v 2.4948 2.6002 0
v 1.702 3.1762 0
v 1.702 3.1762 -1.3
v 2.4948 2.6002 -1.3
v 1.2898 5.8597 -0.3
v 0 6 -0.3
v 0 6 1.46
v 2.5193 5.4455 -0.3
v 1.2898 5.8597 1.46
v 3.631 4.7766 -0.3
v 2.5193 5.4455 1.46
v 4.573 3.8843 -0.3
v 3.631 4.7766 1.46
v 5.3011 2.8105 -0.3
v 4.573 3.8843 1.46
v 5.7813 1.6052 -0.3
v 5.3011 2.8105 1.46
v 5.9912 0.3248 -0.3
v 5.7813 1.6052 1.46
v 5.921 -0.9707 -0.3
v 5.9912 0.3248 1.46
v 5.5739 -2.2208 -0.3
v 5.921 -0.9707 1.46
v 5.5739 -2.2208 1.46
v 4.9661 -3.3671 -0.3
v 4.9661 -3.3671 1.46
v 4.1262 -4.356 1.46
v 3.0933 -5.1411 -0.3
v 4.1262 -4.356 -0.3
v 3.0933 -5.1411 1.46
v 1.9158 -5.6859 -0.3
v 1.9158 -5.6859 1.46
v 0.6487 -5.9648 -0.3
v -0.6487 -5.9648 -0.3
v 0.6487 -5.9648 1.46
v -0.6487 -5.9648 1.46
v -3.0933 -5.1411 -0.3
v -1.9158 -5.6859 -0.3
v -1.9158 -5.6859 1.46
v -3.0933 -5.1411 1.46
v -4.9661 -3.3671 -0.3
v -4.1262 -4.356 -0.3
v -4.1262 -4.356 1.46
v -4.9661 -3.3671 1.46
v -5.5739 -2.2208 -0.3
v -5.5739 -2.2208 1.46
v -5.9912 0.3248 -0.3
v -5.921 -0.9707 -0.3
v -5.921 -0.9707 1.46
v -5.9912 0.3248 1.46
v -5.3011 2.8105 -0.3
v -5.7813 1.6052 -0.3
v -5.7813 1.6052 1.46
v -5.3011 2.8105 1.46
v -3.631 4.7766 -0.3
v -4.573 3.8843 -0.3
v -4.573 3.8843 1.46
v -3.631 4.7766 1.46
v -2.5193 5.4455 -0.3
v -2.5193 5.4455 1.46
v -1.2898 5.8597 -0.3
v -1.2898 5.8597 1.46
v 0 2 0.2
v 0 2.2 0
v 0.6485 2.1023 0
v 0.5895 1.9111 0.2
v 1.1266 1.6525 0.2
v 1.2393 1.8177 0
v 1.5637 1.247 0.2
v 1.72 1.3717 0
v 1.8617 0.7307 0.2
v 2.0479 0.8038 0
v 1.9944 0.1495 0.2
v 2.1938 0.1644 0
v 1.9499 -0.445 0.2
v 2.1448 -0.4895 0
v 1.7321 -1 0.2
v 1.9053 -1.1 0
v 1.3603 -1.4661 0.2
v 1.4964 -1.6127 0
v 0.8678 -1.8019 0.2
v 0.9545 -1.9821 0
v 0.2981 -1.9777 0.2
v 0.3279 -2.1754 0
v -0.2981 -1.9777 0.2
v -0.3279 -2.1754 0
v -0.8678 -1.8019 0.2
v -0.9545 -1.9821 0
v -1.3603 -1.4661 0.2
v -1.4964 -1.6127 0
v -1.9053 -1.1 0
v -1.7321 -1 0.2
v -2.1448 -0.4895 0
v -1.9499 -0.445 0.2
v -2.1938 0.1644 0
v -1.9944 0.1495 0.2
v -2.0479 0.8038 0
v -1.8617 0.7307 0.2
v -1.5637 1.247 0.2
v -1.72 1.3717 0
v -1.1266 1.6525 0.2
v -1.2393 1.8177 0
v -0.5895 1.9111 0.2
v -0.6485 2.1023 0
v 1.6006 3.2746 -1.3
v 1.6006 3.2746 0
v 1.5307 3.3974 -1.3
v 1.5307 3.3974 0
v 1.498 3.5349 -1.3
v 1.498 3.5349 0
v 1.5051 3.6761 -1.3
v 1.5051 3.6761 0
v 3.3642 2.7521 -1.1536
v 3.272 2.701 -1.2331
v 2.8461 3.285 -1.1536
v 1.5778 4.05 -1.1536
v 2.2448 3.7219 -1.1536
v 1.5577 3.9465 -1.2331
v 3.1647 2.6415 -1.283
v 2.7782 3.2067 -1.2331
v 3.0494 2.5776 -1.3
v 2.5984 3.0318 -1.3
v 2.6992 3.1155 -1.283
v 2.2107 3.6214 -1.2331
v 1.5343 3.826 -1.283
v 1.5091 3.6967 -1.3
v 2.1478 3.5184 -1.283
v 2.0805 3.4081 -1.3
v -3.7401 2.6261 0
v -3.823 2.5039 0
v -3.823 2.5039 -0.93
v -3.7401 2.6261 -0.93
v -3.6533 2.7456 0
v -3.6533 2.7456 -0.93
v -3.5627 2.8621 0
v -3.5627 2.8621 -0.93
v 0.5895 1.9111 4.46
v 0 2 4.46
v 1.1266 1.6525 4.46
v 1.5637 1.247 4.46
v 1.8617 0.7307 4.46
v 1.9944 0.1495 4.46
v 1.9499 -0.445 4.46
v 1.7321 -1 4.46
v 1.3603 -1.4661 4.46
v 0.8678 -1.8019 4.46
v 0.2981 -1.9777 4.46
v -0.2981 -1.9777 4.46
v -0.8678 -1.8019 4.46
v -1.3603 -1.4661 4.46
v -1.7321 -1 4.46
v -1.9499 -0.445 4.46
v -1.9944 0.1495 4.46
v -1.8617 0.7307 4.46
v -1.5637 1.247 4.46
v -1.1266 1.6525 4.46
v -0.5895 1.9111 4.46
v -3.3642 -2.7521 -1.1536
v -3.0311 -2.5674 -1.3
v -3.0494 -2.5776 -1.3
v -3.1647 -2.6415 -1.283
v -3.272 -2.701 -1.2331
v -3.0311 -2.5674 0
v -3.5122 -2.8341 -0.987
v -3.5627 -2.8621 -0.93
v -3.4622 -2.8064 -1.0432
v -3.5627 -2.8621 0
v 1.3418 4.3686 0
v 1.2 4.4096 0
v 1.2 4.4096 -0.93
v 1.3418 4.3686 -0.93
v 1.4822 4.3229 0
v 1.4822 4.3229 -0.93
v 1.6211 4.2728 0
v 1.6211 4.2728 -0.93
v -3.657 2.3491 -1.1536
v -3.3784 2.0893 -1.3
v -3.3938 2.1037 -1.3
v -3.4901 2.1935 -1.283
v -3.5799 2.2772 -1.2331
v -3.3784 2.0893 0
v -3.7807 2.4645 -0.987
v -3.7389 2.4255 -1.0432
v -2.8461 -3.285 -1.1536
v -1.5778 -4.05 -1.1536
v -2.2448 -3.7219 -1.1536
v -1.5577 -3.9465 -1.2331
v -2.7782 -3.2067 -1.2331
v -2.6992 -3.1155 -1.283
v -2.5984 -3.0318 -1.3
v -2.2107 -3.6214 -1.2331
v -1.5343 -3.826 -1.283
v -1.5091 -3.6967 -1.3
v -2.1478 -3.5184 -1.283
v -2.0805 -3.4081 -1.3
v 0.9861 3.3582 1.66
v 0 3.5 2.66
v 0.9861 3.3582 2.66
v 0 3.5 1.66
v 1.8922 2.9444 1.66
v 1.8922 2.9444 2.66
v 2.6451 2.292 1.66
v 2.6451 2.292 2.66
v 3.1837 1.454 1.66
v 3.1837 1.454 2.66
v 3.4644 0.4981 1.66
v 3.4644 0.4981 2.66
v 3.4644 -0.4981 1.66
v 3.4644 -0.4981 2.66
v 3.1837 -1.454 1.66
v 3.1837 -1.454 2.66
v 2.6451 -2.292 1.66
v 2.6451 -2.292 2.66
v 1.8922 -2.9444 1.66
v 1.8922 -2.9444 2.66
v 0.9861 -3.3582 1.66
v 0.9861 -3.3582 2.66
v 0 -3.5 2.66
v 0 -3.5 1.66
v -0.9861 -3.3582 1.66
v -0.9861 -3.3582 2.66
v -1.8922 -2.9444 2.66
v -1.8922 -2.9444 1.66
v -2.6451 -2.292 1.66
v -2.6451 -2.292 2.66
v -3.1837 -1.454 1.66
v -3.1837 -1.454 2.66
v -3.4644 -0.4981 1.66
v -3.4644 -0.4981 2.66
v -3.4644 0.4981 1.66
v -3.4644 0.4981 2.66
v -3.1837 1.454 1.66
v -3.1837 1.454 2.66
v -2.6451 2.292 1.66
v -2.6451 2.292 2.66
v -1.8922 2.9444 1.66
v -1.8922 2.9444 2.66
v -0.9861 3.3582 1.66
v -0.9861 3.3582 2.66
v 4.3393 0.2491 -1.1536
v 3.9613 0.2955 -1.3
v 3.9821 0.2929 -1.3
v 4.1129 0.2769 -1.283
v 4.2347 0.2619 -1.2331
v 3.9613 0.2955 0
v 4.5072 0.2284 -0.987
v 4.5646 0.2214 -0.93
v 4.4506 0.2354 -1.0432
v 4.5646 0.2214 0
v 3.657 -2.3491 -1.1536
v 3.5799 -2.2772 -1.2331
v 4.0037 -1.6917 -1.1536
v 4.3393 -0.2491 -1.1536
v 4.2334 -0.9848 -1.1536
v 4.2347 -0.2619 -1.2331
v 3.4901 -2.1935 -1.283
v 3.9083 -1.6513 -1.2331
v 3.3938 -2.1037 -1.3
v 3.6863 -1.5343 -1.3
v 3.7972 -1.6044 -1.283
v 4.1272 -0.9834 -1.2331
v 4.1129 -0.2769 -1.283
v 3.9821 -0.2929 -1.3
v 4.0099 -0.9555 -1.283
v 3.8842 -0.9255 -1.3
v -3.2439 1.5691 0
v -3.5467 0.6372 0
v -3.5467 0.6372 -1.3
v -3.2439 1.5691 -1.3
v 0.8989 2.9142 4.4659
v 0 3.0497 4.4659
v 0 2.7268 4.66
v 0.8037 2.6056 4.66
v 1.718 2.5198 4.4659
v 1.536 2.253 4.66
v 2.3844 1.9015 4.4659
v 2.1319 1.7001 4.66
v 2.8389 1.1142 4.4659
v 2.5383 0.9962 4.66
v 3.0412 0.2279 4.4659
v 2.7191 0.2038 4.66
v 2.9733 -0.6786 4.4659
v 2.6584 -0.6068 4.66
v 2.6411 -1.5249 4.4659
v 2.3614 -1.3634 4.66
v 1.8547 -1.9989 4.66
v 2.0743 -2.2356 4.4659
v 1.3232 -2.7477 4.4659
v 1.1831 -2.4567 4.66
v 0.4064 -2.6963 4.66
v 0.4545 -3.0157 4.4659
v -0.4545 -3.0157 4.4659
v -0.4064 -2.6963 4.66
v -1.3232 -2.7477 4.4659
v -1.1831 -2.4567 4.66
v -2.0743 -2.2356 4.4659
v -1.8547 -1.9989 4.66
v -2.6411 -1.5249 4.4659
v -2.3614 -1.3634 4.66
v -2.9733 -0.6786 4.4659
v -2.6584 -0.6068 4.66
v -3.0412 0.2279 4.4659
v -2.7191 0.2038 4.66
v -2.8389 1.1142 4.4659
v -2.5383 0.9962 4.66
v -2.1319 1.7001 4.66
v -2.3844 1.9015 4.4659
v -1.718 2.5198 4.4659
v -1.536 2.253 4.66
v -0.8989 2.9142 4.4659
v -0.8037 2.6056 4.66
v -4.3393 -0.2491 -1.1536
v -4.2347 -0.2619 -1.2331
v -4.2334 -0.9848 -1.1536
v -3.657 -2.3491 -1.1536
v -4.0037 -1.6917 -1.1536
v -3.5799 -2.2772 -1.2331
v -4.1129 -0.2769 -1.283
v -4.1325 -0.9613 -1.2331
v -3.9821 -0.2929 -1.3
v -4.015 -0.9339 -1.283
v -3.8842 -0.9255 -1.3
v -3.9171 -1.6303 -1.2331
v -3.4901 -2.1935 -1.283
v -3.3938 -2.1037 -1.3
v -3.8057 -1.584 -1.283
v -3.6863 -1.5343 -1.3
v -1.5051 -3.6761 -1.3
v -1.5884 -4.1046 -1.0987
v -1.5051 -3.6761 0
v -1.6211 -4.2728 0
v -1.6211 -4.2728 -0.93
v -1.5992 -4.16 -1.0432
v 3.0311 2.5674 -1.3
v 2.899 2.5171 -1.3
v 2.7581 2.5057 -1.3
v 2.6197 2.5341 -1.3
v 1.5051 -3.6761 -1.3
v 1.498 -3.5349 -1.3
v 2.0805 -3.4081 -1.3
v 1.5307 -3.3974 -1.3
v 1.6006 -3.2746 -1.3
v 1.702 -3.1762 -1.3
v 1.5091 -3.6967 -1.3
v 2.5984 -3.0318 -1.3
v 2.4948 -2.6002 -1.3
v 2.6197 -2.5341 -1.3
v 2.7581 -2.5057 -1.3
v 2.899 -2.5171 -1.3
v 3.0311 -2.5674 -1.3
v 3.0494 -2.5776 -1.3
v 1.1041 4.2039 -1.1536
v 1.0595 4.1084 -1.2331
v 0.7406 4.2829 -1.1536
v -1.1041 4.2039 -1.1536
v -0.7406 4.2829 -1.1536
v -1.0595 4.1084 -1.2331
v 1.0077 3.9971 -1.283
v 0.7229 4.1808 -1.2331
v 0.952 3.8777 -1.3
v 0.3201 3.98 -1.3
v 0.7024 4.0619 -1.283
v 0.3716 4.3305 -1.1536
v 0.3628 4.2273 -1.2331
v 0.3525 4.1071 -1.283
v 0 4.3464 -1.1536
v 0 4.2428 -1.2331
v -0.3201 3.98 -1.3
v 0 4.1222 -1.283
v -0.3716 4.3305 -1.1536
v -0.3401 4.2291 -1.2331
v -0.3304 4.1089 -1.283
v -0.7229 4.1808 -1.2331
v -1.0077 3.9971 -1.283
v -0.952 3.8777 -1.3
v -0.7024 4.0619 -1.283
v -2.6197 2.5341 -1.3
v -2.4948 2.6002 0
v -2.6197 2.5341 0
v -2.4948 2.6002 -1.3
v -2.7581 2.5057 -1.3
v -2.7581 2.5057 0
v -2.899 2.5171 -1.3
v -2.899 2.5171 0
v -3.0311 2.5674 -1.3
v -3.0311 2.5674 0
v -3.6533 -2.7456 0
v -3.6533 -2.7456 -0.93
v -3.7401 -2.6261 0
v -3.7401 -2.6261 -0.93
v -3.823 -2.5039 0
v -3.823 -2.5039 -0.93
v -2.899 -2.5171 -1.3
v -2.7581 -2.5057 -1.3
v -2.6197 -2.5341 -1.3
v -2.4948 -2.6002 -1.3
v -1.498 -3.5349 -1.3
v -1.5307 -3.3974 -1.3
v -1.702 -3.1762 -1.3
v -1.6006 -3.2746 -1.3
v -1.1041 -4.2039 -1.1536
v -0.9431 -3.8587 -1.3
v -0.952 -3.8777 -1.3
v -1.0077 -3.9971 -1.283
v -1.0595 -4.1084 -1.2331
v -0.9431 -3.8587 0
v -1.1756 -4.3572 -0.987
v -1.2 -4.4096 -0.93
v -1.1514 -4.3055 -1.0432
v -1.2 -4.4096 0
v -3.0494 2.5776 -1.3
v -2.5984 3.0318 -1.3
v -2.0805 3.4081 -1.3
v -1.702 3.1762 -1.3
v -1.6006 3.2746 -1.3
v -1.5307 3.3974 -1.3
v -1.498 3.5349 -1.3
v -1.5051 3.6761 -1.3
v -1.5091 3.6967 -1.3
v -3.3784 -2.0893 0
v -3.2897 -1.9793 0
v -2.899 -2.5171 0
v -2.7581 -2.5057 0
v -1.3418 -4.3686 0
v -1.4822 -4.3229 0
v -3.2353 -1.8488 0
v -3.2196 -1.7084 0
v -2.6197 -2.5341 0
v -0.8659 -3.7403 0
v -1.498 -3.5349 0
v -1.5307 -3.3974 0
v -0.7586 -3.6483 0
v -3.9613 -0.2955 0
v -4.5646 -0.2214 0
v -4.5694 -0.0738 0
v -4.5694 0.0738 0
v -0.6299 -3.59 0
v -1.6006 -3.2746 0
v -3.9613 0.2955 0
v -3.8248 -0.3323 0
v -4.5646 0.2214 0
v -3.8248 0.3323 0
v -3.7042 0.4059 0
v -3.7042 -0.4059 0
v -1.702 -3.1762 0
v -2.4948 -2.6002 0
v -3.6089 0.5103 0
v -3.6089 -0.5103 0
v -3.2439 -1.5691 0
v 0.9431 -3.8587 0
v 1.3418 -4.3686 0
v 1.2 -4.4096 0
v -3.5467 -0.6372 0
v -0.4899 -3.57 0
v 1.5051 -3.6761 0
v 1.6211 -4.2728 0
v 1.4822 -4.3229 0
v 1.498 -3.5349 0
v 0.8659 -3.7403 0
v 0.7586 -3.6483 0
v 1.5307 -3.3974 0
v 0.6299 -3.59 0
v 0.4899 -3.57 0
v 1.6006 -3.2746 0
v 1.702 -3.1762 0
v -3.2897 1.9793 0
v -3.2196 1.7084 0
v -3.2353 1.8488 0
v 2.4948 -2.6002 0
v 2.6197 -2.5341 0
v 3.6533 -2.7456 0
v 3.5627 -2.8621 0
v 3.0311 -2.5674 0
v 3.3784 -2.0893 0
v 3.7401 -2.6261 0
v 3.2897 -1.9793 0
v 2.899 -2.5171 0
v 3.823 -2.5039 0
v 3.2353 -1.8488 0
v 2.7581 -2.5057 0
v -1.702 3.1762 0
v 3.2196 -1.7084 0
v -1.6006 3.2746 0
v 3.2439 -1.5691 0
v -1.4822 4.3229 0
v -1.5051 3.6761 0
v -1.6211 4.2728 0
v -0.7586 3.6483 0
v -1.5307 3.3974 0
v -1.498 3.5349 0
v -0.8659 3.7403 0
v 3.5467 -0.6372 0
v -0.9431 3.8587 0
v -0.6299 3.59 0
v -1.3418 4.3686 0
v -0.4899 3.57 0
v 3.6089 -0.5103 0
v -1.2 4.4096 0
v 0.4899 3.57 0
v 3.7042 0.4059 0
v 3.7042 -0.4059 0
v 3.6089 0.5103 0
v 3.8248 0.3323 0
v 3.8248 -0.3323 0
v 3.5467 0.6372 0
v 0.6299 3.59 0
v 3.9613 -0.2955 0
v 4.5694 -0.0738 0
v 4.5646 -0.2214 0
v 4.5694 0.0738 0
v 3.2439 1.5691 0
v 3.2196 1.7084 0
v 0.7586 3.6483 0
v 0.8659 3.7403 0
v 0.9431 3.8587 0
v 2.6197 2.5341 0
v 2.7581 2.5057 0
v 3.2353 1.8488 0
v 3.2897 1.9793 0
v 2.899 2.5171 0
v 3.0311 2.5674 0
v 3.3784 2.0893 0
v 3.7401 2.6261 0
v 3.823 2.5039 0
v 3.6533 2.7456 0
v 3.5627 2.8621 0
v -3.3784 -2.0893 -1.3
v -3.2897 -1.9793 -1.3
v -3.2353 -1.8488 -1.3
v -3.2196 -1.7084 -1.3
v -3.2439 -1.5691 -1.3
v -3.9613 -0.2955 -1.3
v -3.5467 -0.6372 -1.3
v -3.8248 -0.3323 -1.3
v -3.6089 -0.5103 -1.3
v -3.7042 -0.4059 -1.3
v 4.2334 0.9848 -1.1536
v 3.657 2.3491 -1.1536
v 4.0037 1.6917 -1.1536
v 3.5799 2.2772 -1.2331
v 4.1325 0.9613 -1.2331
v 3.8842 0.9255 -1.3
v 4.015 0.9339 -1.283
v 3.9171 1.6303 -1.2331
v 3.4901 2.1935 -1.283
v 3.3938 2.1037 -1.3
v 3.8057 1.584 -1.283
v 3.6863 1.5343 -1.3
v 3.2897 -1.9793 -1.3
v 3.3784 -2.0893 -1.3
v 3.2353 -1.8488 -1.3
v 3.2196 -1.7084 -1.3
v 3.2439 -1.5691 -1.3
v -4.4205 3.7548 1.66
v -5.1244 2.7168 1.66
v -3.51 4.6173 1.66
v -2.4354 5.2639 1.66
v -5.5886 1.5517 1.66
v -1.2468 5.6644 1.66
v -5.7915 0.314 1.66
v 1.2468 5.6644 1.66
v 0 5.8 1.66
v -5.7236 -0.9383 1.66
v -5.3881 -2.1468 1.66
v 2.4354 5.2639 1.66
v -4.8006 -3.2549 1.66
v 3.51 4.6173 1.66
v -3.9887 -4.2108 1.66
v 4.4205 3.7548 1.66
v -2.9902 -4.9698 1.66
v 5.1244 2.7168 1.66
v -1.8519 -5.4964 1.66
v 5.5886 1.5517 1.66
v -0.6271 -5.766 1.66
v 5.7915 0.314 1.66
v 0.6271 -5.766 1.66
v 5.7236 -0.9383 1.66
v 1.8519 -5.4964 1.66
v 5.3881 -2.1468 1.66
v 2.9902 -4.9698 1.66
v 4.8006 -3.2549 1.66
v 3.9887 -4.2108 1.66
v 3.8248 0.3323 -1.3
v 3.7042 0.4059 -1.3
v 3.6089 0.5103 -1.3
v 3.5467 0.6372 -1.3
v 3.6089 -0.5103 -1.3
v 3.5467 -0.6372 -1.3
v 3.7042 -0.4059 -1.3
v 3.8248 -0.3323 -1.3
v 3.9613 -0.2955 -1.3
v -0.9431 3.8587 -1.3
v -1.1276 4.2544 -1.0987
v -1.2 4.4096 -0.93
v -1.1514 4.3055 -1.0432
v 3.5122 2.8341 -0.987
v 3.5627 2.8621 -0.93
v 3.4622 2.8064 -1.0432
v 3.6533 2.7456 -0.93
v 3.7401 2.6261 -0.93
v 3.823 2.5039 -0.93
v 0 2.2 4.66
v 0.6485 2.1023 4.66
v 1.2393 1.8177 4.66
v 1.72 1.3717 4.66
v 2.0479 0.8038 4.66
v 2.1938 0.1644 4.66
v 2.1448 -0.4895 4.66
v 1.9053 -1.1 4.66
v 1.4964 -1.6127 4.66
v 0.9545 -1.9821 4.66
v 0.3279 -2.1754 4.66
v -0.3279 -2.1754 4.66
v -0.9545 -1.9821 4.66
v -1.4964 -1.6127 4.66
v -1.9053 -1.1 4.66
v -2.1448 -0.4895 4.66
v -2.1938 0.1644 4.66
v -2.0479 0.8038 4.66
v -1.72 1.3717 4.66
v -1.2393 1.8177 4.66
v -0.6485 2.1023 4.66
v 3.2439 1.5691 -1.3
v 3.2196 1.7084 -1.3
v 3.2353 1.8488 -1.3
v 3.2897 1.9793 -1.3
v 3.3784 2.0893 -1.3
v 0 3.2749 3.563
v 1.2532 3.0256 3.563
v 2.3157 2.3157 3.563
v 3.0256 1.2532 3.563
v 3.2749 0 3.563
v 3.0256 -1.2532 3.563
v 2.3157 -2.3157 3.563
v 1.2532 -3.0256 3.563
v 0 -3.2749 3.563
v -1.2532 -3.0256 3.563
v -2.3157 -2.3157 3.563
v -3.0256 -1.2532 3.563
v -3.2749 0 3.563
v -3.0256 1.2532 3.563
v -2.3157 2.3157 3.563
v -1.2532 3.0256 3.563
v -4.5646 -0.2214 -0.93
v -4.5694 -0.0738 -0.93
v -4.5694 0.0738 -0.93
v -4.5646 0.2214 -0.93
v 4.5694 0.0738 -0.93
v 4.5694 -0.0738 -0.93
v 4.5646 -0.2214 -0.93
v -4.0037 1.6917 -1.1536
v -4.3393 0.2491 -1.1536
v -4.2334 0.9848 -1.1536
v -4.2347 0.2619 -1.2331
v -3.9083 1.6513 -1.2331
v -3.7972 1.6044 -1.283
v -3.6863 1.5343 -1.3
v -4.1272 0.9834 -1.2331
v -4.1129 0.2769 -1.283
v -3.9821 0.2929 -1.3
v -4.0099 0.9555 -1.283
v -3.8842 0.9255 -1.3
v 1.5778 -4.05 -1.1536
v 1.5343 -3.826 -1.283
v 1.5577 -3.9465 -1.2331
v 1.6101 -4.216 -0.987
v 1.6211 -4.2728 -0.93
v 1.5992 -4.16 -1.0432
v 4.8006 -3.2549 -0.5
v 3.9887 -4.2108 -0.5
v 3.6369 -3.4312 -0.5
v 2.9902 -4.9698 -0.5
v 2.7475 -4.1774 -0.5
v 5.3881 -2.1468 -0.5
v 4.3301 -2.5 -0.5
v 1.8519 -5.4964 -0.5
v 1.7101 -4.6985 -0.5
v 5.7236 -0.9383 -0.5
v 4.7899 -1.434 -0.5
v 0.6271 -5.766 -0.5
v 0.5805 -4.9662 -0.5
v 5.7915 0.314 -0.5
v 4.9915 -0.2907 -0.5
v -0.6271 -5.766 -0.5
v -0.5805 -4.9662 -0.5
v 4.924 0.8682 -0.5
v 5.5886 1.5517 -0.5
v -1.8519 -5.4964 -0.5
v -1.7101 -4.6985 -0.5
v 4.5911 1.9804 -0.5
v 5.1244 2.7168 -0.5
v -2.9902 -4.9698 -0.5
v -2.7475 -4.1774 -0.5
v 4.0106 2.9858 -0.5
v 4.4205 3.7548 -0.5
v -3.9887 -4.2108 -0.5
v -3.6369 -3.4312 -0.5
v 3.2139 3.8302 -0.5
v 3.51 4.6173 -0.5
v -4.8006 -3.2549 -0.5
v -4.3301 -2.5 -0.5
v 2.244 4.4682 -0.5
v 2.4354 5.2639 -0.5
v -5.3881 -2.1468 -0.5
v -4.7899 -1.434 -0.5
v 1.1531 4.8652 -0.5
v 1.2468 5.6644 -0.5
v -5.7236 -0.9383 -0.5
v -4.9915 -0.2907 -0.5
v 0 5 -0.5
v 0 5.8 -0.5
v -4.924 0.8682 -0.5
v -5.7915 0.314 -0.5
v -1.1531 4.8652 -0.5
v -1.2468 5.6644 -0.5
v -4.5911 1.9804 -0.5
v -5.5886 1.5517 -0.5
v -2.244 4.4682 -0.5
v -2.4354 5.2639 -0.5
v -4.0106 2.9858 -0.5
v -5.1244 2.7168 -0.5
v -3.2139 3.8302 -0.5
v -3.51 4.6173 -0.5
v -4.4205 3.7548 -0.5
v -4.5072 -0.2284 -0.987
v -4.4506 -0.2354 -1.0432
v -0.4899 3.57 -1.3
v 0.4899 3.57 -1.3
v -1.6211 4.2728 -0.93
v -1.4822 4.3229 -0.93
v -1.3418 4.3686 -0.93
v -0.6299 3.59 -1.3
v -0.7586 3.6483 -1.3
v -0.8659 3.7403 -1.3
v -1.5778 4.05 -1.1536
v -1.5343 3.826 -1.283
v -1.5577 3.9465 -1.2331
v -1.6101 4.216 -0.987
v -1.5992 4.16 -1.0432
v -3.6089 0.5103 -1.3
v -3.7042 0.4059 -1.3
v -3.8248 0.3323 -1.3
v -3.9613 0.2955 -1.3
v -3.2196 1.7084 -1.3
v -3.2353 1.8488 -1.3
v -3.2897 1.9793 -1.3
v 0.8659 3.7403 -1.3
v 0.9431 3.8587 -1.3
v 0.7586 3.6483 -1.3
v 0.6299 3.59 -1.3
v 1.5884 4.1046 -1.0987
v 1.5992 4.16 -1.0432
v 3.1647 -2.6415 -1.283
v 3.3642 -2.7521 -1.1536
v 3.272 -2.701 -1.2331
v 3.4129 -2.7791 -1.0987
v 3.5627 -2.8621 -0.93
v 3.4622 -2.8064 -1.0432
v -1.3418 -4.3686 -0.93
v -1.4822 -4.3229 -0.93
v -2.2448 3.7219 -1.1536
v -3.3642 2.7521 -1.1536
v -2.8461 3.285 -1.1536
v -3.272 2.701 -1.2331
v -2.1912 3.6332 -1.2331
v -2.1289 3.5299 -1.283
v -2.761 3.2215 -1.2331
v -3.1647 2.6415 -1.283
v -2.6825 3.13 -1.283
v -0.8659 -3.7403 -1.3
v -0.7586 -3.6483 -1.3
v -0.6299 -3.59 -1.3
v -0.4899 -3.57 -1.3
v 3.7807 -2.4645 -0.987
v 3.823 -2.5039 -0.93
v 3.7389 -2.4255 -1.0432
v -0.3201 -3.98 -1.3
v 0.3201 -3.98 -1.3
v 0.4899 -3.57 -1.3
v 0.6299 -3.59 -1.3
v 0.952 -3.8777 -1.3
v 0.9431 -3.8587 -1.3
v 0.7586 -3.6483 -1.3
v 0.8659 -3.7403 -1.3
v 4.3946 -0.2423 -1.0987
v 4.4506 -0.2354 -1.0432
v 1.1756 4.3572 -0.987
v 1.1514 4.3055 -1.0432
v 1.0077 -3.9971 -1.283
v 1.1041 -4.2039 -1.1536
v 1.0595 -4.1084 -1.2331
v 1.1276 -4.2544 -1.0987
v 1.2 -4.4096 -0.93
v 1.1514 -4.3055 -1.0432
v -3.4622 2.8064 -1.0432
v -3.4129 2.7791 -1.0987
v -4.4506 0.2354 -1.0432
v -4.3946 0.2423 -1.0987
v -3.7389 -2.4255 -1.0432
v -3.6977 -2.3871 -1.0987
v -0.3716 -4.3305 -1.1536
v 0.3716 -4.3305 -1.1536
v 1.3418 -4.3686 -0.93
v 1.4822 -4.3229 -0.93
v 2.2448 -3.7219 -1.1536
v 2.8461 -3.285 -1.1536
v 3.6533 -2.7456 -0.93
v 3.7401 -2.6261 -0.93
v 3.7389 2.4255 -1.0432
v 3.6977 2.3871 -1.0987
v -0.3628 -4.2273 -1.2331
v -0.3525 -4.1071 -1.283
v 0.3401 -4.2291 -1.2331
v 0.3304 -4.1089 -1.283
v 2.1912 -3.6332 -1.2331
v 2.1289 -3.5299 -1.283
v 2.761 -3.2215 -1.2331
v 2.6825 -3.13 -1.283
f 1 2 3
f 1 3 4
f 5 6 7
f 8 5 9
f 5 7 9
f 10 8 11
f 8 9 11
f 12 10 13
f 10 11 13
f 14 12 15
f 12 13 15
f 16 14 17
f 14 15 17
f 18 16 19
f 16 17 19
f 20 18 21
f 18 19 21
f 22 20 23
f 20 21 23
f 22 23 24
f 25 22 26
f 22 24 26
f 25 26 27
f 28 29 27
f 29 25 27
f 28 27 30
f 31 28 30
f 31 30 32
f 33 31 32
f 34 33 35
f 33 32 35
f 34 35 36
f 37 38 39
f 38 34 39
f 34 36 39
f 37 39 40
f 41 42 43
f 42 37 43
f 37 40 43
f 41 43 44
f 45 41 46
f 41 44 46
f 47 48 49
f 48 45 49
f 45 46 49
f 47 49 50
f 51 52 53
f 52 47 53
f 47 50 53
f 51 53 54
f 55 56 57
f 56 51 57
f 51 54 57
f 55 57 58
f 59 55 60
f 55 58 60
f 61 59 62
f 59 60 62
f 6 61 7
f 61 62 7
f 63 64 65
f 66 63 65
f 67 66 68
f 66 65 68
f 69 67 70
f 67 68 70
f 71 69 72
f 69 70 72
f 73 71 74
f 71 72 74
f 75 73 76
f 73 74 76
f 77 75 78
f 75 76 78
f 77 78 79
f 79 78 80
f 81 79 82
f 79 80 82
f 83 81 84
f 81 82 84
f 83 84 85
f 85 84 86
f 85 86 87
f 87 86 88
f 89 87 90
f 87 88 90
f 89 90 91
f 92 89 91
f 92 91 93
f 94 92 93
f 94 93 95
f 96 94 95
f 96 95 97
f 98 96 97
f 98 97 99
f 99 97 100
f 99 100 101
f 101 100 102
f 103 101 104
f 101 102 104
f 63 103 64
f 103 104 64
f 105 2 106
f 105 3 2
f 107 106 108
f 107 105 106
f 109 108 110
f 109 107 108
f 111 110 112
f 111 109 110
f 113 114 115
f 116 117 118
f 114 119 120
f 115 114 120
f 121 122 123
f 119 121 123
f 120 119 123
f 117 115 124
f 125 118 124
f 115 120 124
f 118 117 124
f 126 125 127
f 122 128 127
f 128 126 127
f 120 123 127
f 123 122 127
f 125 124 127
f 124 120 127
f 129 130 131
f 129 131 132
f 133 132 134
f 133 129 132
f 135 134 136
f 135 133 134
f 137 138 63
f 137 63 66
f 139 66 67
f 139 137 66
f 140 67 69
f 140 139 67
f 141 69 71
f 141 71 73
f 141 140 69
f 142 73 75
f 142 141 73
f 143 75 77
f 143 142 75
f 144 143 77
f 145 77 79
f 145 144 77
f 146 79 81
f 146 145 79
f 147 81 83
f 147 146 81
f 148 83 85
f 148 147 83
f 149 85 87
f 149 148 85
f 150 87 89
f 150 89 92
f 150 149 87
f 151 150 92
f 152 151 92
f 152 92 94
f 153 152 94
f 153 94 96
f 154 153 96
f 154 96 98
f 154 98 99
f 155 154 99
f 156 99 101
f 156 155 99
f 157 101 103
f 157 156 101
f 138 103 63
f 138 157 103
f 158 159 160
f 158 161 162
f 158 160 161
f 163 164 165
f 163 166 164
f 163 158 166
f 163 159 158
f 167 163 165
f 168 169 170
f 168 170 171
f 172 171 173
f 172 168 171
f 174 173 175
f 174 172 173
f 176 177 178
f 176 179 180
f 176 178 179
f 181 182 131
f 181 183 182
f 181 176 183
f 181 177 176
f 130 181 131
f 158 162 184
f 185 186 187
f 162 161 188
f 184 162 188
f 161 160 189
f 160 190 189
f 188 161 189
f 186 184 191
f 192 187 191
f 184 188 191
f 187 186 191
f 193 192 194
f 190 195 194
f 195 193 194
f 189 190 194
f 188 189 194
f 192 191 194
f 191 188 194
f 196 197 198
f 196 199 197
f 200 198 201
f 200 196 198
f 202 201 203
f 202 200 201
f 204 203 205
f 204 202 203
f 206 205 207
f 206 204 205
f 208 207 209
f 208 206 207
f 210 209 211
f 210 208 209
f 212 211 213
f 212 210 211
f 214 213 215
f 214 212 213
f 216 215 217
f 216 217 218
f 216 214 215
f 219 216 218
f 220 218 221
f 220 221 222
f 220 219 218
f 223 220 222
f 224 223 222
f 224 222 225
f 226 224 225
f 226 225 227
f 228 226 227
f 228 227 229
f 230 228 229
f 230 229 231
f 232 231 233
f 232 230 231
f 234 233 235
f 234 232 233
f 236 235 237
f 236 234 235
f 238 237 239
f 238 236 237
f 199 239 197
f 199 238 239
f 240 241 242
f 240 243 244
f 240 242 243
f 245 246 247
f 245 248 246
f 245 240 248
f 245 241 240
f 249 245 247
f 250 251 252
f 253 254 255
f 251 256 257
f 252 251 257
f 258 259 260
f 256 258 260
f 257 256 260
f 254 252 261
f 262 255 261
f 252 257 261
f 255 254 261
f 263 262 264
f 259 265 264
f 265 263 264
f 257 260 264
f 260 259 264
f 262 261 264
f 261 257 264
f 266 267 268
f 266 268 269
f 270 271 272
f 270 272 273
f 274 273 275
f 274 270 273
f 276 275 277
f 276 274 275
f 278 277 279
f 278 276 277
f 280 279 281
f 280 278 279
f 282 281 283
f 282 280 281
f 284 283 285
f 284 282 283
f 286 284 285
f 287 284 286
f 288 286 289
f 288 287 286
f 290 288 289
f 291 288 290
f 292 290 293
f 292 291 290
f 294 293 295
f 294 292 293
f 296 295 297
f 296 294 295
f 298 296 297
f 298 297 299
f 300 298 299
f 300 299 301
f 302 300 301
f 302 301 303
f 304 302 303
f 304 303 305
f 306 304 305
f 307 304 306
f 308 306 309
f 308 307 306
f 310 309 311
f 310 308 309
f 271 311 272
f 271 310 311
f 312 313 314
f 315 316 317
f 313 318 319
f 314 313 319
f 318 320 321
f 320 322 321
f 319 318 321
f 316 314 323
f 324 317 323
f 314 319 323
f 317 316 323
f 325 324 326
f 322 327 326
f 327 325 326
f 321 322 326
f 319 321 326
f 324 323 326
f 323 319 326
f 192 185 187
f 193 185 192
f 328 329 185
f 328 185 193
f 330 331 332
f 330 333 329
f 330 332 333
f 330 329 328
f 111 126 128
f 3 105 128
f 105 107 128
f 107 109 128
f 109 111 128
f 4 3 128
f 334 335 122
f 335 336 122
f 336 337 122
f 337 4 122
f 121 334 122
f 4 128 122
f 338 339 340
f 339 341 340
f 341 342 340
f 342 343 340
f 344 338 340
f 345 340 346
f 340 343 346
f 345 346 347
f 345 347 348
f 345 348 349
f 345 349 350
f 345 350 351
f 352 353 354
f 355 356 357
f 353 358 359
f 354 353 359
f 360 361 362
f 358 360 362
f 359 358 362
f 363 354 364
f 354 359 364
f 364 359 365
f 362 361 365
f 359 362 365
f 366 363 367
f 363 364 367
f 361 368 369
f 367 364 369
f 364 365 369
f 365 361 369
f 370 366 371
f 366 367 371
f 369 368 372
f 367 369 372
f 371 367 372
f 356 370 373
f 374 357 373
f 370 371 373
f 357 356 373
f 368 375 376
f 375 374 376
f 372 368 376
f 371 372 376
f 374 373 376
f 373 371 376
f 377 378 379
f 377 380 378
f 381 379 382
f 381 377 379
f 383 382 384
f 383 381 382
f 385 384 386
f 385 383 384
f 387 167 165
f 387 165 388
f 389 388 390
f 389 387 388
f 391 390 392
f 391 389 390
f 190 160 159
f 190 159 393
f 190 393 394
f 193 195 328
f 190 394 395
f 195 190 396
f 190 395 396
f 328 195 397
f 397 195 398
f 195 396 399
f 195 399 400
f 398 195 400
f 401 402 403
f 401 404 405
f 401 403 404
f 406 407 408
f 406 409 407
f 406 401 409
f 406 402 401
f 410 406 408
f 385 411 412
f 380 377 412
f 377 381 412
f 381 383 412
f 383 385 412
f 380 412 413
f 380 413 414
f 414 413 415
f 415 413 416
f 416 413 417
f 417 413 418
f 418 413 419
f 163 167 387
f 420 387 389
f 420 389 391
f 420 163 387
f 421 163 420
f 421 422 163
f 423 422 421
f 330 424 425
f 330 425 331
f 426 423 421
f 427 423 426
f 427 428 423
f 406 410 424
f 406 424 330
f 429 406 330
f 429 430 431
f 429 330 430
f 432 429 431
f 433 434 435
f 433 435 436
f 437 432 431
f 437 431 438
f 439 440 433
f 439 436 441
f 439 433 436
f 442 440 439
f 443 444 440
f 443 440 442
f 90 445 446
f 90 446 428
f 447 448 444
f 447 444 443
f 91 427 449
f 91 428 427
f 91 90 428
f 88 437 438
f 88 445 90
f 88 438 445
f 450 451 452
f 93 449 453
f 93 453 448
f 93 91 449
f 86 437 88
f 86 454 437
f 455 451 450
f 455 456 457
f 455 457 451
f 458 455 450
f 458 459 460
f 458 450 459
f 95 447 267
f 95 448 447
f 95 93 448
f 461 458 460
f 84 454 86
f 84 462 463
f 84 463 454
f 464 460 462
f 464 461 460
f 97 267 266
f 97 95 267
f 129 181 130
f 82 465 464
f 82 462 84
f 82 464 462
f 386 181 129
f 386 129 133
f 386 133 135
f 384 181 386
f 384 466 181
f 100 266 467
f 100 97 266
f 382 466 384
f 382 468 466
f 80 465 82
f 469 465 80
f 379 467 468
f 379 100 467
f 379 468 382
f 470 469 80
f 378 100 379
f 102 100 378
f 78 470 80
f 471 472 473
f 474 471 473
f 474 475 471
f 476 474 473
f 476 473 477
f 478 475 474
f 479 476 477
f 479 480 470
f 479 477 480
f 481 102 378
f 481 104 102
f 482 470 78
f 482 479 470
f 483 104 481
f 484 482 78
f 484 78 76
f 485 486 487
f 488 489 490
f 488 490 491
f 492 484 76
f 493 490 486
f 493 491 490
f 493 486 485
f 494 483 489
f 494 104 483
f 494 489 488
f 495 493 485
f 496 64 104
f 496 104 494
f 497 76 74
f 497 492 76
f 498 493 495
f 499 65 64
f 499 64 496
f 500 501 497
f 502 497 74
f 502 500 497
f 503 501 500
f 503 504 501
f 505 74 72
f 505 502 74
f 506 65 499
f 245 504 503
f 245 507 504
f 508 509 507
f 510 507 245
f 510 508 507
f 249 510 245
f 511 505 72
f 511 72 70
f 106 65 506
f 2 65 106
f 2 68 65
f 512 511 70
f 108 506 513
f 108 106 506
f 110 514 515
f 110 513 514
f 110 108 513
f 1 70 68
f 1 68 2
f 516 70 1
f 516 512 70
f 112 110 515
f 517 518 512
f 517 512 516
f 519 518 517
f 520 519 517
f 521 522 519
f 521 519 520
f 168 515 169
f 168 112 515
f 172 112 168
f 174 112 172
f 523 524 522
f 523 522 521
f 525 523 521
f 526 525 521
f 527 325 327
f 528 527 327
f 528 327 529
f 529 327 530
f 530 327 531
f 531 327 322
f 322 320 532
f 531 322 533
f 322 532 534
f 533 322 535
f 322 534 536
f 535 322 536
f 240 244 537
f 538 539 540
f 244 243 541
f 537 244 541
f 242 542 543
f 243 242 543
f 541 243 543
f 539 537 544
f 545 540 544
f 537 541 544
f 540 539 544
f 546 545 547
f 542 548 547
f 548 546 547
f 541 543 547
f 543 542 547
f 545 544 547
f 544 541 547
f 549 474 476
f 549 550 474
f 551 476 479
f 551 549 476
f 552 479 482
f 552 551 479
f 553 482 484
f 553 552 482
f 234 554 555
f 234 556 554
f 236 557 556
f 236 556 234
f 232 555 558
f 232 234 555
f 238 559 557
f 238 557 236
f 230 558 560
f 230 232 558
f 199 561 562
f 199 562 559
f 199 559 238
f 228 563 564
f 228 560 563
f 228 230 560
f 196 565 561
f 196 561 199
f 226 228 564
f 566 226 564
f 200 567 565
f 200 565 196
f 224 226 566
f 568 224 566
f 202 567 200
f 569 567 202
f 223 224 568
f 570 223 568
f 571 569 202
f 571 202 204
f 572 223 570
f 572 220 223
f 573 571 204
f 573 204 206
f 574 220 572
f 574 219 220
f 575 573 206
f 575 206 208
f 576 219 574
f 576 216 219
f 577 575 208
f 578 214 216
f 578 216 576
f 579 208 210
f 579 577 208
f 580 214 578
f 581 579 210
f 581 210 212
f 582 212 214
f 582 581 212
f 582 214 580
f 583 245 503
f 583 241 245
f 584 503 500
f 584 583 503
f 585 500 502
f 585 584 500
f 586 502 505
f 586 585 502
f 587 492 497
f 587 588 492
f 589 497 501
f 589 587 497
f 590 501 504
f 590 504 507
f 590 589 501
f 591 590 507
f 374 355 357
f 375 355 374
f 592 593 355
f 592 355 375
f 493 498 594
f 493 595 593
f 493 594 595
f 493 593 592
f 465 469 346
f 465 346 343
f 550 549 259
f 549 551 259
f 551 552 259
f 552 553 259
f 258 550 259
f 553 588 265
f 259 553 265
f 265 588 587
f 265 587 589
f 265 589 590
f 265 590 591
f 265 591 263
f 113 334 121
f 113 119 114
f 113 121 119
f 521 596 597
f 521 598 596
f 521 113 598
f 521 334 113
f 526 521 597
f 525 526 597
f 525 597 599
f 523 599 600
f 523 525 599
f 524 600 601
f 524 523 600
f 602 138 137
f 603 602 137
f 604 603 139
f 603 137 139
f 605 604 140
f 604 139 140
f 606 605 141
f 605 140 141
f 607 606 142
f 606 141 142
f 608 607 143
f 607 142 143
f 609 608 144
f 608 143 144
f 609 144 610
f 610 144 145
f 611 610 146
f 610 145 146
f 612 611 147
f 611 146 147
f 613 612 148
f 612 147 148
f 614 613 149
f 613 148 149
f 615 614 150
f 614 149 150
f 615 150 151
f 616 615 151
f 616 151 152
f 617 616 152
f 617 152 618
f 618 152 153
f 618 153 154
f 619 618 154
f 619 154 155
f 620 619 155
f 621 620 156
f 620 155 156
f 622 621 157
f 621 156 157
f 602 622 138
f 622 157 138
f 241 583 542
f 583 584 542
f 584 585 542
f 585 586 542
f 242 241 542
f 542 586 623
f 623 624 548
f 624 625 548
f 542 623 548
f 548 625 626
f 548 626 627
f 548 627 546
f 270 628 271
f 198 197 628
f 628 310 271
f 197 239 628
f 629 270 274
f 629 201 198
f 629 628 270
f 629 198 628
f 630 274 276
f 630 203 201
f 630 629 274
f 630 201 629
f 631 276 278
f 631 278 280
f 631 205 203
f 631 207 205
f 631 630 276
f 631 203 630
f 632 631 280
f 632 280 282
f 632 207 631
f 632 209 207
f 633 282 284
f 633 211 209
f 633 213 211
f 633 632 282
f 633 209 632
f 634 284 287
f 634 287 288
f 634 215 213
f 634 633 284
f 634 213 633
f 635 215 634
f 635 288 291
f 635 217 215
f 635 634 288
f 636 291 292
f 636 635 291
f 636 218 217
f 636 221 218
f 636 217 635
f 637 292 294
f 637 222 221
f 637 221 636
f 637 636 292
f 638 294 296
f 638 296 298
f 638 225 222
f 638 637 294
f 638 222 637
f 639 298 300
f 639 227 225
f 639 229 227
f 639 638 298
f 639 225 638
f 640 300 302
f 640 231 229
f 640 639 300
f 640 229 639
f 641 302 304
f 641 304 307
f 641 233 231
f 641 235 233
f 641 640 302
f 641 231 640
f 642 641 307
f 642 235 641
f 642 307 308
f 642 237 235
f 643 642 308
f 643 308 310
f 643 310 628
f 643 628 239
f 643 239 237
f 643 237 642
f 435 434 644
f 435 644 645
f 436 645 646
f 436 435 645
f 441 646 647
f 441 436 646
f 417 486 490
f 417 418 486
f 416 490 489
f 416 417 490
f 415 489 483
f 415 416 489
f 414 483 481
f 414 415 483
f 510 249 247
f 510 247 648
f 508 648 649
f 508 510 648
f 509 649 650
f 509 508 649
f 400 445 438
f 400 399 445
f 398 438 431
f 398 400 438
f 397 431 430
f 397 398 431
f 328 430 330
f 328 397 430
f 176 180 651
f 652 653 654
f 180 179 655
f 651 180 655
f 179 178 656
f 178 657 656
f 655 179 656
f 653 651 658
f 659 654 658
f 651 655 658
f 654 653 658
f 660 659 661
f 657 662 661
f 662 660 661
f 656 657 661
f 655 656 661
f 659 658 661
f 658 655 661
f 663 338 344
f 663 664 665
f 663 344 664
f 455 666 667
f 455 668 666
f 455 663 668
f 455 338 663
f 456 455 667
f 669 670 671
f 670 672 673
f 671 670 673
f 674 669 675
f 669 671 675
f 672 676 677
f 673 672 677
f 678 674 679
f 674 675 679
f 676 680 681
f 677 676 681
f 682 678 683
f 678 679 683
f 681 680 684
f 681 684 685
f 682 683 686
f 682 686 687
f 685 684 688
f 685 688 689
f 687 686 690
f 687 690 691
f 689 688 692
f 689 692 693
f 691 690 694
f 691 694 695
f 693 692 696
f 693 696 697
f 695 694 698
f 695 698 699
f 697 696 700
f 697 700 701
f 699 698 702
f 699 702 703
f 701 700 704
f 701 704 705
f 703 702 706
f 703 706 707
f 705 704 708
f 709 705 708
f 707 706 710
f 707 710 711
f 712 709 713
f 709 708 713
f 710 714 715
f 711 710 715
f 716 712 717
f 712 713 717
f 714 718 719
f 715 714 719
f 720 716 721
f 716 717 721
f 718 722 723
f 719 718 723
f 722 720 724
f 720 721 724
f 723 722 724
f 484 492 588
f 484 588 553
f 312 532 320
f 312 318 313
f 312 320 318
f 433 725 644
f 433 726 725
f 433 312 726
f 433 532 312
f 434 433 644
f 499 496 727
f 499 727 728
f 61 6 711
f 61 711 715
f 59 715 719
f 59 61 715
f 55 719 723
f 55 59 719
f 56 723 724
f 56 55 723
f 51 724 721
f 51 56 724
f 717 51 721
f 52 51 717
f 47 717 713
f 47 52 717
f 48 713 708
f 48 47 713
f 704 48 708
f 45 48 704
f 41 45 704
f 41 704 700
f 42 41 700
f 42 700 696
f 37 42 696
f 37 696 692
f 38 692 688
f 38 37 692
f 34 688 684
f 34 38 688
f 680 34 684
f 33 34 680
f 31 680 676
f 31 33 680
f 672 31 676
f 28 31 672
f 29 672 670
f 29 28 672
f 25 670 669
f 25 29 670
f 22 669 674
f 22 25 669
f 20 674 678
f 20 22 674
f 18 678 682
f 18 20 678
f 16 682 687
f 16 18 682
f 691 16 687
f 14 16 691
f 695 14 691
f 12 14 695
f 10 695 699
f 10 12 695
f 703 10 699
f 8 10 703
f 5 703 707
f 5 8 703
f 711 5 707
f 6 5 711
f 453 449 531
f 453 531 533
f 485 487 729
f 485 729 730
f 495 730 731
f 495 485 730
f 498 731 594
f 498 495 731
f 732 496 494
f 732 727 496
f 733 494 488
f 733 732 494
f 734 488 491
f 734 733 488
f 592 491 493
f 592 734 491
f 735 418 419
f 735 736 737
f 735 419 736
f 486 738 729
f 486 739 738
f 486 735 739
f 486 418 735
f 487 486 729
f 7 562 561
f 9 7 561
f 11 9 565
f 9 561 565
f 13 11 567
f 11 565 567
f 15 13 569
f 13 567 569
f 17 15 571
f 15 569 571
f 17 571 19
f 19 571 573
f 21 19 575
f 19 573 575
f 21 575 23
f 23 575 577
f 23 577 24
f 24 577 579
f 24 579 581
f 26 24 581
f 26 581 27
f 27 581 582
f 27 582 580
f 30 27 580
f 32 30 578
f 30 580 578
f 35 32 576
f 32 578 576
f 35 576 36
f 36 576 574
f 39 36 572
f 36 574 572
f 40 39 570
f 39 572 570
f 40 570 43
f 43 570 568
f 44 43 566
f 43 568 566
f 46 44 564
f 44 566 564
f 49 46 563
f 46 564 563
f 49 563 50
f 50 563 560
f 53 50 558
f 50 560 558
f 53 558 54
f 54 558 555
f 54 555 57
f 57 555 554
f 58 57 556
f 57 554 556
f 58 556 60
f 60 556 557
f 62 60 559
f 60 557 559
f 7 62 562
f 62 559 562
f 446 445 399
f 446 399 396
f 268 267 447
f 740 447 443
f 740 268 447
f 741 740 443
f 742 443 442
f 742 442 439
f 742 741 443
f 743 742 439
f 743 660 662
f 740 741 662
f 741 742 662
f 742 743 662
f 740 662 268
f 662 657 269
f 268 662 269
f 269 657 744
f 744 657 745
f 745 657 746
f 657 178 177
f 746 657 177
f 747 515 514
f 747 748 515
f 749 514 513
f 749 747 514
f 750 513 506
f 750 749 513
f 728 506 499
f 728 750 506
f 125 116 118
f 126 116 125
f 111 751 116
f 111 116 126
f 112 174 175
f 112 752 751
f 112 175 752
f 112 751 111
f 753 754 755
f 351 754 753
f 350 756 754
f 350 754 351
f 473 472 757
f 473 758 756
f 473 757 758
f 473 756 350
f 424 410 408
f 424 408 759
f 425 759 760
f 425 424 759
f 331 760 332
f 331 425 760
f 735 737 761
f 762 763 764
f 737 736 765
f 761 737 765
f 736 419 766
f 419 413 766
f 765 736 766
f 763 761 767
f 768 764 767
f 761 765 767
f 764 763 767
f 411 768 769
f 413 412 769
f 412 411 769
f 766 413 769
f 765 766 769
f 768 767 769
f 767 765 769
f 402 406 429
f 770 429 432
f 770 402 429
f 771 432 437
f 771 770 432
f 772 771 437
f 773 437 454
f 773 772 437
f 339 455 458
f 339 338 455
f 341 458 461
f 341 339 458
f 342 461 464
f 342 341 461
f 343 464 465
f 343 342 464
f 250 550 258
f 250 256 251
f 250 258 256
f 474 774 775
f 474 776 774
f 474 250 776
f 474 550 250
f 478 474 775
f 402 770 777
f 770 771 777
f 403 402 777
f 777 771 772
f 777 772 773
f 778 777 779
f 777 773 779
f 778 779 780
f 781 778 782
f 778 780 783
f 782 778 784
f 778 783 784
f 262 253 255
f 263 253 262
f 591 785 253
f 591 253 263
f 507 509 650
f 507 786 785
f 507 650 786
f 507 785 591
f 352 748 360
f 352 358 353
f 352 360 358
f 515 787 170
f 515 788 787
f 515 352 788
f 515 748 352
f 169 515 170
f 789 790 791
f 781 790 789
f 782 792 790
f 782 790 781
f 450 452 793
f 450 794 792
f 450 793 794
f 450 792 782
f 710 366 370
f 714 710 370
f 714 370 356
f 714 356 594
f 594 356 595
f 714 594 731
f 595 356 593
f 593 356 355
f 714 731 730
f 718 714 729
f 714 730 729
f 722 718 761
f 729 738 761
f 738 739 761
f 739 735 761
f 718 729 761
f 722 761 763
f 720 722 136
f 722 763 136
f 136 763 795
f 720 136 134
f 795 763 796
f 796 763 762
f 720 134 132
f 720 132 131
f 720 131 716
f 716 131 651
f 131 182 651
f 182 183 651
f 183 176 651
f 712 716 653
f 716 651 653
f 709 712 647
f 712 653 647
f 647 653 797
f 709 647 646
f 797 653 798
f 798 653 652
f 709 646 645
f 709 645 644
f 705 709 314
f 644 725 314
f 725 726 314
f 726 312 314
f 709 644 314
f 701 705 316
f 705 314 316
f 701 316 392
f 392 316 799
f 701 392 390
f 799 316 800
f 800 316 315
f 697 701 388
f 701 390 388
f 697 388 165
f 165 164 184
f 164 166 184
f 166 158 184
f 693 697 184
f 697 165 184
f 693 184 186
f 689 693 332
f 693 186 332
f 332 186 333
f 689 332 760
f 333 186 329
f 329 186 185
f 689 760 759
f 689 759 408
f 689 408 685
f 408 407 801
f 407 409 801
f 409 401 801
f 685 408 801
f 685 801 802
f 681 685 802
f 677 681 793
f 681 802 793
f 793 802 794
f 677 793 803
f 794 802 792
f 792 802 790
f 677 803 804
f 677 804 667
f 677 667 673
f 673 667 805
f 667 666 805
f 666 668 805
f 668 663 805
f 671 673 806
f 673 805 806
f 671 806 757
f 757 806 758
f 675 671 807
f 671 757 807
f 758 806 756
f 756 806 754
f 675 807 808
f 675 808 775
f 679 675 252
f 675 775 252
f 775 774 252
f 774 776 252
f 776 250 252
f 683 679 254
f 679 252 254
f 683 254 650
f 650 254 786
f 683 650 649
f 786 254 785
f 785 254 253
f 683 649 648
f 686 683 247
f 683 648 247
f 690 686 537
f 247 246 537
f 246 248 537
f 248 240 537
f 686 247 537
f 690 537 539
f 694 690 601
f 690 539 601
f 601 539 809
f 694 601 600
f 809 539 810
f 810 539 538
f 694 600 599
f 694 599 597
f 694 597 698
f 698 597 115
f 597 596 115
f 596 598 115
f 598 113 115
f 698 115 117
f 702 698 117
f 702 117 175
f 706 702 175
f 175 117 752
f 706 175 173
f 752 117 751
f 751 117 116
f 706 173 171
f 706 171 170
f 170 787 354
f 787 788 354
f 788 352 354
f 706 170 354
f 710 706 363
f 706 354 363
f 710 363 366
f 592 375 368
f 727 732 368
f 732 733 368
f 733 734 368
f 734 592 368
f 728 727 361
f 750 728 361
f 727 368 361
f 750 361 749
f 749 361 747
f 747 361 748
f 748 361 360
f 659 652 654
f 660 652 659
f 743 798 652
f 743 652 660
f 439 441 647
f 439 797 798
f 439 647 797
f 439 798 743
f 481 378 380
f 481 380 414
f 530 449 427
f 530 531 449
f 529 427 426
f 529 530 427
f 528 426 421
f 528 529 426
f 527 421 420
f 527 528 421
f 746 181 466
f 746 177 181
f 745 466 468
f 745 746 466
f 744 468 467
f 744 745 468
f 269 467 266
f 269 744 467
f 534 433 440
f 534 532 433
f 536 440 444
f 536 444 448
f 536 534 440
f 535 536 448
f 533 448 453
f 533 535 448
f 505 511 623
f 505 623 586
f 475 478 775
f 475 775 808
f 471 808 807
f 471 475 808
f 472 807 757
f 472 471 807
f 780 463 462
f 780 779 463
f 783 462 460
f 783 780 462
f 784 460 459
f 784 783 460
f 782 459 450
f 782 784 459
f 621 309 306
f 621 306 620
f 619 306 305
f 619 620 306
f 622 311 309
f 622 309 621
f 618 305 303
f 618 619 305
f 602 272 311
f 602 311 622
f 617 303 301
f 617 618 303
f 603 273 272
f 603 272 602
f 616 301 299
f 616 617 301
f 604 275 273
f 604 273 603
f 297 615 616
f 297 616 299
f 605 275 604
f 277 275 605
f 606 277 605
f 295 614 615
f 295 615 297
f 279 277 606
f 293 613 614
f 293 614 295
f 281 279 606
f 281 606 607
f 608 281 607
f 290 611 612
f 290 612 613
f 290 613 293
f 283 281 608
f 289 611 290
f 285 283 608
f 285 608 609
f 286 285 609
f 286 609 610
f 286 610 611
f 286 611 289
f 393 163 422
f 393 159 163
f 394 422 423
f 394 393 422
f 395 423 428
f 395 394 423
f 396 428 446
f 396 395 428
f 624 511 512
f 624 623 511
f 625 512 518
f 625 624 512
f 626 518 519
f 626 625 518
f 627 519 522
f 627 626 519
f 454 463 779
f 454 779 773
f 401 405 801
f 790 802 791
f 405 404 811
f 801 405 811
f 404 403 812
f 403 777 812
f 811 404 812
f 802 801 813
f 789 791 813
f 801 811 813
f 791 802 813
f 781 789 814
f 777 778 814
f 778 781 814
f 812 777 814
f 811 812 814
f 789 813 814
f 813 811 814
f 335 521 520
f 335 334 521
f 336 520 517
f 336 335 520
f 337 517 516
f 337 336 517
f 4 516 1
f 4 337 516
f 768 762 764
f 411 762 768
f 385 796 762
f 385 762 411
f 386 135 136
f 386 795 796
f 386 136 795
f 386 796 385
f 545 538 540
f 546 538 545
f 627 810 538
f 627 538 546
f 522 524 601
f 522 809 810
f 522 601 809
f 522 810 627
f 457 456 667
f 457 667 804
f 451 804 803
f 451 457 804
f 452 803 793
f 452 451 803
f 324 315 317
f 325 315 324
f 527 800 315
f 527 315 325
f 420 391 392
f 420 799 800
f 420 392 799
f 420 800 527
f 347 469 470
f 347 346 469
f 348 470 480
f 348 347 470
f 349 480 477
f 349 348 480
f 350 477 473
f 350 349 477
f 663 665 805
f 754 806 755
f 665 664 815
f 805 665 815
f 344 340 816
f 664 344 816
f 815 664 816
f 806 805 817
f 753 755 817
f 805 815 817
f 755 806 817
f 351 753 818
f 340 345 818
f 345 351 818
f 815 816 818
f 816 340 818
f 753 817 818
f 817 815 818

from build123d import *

# Parameters (mm, degrees)
AUFSATZ_LINEAR_AUSTRAGEN1_DEPTH = 1.3
VERRUNDUNG1_R                   = 0.5
KREISMUSTER1_COUNT              = 10
VERRUNDUNG1_OF_KREISMUSTER1_R   = 0.5
FASE1_SIZE2                     = 0.2
FASE1_SIZE                      = 0.274584275
FASE1_EDGE_2_SIZE               = 0.2
FASE1_EDGE_3_SIZE               = 0.2
FASE1_EDGE_4_SIZE               = 0.2
FASE1_EDGE_5_SIZE               = 0.2


with BuildPart() as part:
    # Skizze1 → Rotation1 (revolve)
    with BuildSketch(Plane(origin=(0, 0, 0), x_dir=(0, 0, -1), z_dir=(1, 0, 0))):
        Polygon((0, 2), (-4.66, 2), (-4.66, 3.001343994), (-2.66, 3.5), (-1.66, 3.5), (-1.66, 6), (0, 6), (1.3, 6), (1.3, 4.57), (0, 4.57), align=None)
    revolve(axis=Axis((0, 0, 23.408695652), (0, 0, -1)))

    # Skizze4 → Aufsatz-Linear austragen1 (add)
    with BuildSketch(Plane(origin=(0, 0, 0), x_dir=(-1, 0, 0), z_dir=(0, 0, -1))):
        with BuildLine():
            Line((-0.808470756, 3.57), (-1.2, 4.409637173))
            ThreePointArc((-1.2, 4.409637173), (0, 4.57), (1.2, 4.409637173))
            Line((1.2, 4.409637173), (0.808470756, 3.57))
            Line((0.808470756, 3.57), (-0.808470756, 3.57))
        make_face()
    aufsatz_linear_austragen1 = extrude(amount=AUFSATZ_LINEAR_AUSTRAGEN1_DEPTH)

    # Verrundung1
    verrundung1_edges = [part.edges().sort_by_distance(p)[0] for p in [
        (-0.808470756, 3.57, -0.65),
        (0.808470756, 3.57, -0.65),
    ]]
    fillet(verrundung1_edges, radius=VERRUNDUNG1_R)

    # Kreismuster1: Aufsatz-Linear austragen1 ×10 about axis
    kreismuster1_axis = Axis((0, 0, 0), (0, 0, 1))
    for i in range(1, KREISMUSTER1_COUNT):
        add(aufsatz_linear_austragen1.rotate(kreismuster1_axis, i * 360 / KREISMUSTER1_COUNT))

    # Verrundung1 of Kreismuster1
    verrundung1_of_kreismuster1_edges = [part.edges().sort_by_distance(p)[0] for p in [
        (-2.752459932, 2.412983483, -0.65),
        (-1.44432677, 3.363397857, -0.65),
        (-3.645102966, 0.334289289, -0.65),
        (-3.14544056, 1.872092051, -0.65),
        (-3.14544056, -1.872092051, -0.65),
        (-3.645102966, -0.334289289, -0.65),
        (-1.44432677, -3.363397857, -0.65),
        (-2.752459932, -2.412983483, -0.65),
        (0.808470756, -3.57, -0.65),
        (-0.808470756, -3.57, -0.65),
        (2.752459932, -2.412983483, -0.65),
        (1.44432677, -3.363397857, -0.65),
        (3.645102966, -0.334289289, -0.65),
        (3.14544056, -1.872092051, -0.65),
        (3.14544056, 1.872092051, -0.65),
        (3.645102966, 0.334289289, -0.65),
        (1.44432677, 3.363397857, -0.65),
        (2.752459932, 2.412983483, -0.65),
    ]]
    fillet(verrundung1_of_kreismuster1_edges, radius=VERRUNDUNG1_OF_KREISMUSTER1_R)

    # Skizze5 → Schnitt-Rotation1 (revolve, cut)
    with BuildSketch(Plane(origin=(0, 0, 0), x_dir=(0, 0, -1), z_dir=(1, 0, 0))):
        with BuildLine():
            Line((0.5, 6), (0.5, 5))
            Line((0.5, 5), (1.153553391, 4.346446609))
            ThreePointArc((1.153553391, 4.346446609), (1.261939766, 4.184234935), (1.3, 3.992893219))
            Line((1.3, 3.992893219), (1.3, 2.59724793))
            Line((1.3, 2.59724793), (2.535311957, 2.59724793))
            Line((2.535311957, 2.59724793), (2.535311957, 6))
            Line((2.535311957, 6), (0.5, 6))
        make_face()
    revolve(axis=Axis((0, 0, -4.981936438), (0, 0, 1)), mode=Mode.SUBTRACT)

    # Fase1
    fase1_edges = [part.edges().sort_by_distance(p)[0] for p in [
        (0, -3.001343994, 4.66),
    ]]
    chamfer(fase1_edges, length=FASE1_SIZE, length2=FASE1_SIZE2)

    # Fase1 edge 2
    fase1_edge_2_edges = [part.edges().sort_by_distance(p)[0] for p in [
        (0, -2, 4.66),
    ]]
    chamfer(fase1_edge_2_edges, length=FASE1_EDGE_2_SIZE)

    # Fase1 edge 3
    fase1_edge_3_edges = [part.edges().sort_by_distance(p)[0] for p in [
        (0, -2, 0),
    ]]
    chamfer(fase1_edge_3_edges, length=FASE1_EDGE_3_SIZE)

    # Fase1 edge 4
    fase1_edge_4_edges = [part.edges().sort_by_distance(p)[0] for p in [
        (0, -6, -0.5),
    ]]
    chamfer(fase1_edge_4_edges, length=FASE1_EDGE_4_SIZE)

    # Fase1 edge 5
    fase1_edge_5_edges = [part.edges().sort_by_distance(p)[0] for p in [
        (0, -6, 1.66),
    ]]
    chamfer(fase1_edge_5_edges, length=FASE1_EDGE_5_SIZE)


solid = part.part
